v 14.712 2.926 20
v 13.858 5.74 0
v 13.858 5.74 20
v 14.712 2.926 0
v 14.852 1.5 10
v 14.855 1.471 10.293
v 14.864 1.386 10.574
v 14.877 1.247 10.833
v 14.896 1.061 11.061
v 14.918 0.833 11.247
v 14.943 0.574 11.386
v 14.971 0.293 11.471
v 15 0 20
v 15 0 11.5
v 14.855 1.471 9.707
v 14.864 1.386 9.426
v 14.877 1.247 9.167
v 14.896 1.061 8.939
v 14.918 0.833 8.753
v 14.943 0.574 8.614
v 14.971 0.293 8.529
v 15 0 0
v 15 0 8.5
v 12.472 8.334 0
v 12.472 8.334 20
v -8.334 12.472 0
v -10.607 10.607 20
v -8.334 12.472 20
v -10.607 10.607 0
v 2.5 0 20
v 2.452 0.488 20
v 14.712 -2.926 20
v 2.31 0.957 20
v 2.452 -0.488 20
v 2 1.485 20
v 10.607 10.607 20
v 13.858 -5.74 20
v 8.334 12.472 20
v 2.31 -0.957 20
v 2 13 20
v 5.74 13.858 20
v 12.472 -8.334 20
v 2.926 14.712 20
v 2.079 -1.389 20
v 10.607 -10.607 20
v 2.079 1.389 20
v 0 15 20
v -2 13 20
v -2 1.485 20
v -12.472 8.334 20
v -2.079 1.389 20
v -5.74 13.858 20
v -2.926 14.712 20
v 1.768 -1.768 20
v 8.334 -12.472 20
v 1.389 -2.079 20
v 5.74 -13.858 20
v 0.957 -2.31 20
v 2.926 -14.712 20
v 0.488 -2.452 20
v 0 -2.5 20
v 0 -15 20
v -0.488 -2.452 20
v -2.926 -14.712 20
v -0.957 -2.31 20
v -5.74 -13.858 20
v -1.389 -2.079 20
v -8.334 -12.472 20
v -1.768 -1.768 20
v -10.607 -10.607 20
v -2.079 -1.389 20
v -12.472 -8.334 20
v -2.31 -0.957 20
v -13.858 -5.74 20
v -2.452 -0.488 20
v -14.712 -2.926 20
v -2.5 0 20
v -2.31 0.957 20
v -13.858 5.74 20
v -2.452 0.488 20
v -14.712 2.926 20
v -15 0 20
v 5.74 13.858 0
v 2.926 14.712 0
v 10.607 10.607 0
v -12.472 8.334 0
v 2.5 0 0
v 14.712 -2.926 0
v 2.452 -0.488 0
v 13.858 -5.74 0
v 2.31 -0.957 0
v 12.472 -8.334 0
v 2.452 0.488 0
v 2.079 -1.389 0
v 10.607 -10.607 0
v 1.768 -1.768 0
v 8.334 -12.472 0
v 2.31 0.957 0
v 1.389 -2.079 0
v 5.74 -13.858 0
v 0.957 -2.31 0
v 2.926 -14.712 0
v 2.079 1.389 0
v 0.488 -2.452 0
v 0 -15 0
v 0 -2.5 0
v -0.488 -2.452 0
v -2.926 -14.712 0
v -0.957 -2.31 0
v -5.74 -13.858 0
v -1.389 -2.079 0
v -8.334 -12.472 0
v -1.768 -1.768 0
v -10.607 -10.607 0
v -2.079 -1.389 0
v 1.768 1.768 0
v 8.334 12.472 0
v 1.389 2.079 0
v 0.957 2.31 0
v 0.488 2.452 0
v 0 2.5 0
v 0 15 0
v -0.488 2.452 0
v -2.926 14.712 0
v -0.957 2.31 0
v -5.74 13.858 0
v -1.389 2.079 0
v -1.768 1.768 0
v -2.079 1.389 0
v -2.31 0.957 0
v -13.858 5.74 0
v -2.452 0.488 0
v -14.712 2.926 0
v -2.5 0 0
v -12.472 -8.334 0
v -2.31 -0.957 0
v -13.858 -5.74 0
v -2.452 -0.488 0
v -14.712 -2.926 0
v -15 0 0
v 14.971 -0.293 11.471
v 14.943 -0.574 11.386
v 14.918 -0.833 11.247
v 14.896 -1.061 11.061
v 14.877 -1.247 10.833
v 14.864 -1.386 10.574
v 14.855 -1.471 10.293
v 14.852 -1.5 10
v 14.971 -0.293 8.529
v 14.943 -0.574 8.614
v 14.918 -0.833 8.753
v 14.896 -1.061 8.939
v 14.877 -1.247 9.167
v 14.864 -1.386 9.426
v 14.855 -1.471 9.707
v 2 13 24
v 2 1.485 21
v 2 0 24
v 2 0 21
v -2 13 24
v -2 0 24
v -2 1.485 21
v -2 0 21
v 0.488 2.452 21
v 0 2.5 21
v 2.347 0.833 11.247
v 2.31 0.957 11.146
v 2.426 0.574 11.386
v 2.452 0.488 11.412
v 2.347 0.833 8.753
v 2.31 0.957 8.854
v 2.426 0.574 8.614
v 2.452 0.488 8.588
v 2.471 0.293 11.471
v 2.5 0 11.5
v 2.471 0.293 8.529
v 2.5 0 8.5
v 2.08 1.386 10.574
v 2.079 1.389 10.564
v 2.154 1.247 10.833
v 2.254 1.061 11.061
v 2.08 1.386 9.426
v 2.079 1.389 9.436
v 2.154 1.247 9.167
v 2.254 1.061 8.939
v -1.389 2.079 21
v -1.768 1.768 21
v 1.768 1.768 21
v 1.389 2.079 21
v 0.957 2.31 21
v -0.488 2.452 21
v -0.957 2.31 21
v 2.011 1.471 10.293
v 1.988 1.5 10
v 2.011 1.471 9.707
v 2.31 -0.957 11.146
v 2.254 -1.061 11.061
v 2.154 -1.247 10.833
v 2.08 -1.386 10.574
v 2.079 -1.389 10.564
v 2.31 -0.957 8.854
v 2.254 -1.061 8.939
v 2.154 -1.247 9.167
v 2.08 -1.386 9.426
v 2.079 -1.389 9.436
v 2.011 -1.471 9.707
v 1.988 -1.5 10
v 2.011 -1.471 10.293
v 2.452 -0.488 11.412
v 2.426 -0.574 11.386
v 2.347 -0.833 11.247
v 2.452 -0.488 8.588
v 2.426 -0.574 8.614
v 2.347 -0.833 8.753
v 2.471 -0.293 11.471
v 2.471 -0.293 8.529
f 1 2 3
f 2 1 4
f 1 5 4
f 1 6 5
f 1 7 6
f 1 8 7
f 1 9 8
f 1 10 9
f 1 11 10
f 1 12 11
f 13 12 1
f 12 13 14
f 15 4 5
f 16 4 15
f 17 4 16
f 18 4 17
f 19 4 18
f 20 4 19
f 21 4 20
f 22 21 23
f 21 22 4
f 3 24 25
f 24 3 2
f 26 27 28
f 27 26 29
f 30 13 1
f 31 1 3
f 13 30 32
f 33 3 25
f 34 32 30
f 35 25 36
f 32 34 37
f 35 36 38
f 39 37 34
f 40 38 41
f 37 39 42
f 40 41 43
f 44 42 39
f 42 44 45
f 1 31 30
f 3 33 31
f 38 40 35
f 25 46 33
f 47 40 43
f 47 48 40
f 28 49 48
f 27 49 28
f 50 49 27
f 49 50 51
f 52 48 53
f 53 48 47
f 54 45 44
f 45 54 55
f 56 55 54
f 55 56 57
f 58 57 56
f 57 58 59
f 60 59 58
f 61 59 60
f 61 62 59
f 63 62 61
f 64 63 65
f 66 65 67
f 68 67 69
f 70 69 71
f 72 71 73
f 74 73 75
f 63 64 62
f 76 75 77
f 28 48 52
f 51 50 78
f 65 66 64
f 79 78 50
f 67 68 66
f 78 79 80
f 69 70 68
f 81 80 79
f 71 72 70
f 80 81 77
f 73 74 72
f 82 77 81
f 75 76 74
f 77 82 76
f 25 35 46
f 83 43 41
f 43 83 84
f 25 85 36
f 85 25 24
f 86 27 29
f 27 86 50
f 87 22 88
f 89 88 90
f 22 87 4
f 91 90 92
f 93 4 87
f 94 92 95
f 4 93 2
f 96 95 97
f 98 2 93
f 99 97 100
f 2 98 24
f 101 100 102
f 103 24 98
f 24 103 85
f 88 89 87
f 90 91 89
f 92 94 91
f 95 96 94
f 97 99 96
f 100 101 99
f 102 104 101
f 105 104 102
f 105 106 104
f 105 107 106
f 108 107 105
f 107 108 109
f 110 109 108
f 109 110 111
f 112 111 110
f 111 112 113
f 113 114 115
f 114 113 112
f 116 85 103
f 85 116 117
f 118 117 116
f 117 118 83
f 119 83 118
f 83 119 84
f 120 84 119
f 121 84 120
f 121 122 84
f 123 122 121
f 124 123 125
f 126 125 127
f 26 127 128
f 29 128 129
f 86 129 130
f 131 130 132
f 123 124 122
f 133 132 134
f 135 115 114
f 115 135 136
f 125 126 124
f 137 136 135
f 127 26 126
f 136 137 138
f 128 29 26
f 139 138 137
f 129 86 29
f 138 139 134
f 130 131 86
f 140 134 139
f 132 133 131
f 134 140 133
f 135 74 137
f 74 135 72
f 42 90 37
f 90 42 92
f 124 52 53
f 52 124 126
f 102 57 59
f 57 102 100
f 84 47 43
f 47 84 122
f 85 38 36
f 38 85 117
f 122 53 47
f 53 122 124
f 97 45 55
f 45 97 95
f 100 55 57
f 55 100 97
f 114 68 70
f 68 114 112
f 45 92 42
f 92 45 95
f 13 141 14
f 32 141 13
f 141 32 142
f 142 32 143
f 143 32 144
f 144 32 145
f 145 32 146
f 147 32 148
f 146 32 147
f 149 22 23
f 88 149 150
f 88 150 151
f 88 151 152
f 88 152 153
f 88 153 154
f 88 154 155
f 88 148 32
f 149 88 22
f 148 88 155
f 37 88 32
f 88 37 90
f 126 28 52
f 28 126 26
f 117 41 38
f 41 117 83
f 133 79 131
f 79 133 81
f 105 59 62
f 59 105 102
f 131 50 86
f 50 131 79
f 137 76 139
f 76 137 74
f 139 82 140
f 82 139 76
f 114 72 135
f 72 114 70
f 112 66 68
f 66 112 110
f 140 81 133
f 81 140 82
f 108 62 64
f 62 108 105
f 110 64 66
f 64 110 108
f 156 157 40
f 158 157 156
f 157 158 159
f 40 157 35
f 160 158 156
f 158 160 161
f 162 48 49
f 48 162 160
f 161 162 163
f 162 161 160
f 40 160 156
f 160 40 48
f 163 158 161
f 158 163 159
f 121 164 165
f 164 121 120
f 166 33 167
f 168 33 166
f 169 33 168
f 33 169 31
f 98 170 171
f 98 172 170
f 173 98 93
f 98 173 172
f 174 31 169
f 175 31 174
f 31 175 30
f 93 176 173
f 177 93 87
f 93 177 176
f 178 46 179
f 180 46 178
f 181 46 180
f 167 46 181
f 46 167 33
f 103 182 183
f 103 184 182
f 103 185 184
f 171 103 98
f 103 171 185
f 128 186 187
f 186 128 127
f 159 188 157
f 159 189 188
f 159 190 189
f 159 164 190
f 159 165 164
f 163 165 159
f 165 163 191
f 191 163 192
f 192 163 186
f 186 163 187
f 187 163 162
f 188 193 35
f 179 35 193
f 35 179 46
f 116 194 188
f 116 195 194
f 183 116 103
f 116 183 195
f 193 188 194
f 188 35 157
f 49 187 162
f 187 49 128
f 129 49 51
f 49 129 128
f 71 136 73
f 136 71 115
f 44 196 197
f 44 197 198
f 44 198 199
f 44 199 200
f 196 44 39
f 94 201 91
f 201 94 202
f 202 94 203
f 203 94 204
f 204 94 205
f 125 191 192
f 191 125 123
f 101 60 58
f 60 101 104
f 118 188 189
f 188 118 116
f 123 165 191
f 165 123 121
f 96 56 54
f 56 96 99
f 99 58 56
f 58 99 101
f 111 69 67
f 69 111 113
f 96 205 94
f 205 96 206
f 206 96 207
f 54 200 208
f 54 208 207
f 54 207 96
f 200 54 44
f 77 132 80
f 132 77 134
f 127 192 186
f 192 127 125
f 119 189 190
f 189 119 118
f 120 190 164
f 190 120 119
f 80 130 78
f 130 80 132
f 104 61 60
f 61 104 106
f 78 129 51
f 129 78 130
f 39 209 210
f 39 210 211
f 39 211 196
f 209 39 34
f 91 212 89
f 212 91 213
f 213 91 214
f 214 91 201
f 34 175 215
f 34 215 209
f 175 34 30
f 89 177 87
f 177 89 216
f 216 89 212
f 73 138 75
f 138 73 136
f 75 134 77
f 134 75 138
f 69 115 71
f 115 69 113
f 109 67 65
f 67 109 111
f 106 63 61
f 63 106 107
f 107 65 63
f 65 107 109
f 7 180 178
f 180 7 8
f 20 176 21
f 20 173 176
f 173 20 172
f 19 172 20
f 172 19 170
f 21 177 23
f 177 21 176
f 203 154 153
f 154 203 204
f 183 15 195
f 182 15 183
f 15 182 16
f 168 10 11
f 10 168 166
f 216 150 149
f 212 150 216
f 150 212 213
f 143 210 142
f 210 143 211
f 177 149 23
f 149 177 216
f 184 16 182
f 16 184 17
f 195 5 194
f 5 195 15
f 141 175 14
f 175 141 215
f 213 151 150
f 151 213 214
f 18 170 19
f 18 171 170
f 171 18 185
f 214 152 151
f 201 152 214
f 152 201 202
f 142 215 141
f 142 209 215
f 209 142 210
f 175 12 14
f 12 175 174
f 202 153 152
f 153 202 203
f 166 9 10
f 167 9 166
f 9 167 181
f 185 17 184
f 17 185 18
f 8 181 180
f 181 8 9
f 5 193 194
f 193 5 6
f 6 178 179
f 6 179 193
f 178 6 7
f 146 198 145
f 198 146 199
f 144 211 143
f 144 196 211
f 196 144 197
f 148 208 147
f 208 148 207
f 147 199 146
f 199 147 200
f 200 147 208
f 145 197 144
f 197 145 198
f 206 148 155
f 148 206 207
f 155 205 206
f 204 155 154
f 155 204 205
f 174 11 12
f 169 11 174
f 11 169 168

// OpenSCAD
$fn = 32;

// ----------------------------------------------------------------------
// Control knob: pointer knob
// ----------------------------------------------------------------------

// --- parameters (mm) ---
rib_w = 4;                // pointer rib width
rib_h = 5;                // pointer rib height
knob_d = 30;              // knob body diameter
knob_h = 20;              // knob body height
bore_d = 5;               // shaft bore diameter
set_d = 3;                // set screw bore diameter

rib_poke = rib_h - 1;  // rib height above the top
total_h = knob_h + rib_h - 1;  // overall height

difference() {
  union() {
    cylinder(h = knob_h, d = knob_d);
    translate([-rib_w / 2, 0, knob_h - 1])
      cube([rib_w, knob_d / 2 - 2, rib_h]);
  }
  translate([0, 0, -1]) cylinder(h = knob_h + 2, d = bore_d);
  translate([-1, 0, knob_h / 2]) rotate([0, 90, 0])
    cylinder(h = knob_d / 2 + bore_d / 2 + 2, d = set_d);}
